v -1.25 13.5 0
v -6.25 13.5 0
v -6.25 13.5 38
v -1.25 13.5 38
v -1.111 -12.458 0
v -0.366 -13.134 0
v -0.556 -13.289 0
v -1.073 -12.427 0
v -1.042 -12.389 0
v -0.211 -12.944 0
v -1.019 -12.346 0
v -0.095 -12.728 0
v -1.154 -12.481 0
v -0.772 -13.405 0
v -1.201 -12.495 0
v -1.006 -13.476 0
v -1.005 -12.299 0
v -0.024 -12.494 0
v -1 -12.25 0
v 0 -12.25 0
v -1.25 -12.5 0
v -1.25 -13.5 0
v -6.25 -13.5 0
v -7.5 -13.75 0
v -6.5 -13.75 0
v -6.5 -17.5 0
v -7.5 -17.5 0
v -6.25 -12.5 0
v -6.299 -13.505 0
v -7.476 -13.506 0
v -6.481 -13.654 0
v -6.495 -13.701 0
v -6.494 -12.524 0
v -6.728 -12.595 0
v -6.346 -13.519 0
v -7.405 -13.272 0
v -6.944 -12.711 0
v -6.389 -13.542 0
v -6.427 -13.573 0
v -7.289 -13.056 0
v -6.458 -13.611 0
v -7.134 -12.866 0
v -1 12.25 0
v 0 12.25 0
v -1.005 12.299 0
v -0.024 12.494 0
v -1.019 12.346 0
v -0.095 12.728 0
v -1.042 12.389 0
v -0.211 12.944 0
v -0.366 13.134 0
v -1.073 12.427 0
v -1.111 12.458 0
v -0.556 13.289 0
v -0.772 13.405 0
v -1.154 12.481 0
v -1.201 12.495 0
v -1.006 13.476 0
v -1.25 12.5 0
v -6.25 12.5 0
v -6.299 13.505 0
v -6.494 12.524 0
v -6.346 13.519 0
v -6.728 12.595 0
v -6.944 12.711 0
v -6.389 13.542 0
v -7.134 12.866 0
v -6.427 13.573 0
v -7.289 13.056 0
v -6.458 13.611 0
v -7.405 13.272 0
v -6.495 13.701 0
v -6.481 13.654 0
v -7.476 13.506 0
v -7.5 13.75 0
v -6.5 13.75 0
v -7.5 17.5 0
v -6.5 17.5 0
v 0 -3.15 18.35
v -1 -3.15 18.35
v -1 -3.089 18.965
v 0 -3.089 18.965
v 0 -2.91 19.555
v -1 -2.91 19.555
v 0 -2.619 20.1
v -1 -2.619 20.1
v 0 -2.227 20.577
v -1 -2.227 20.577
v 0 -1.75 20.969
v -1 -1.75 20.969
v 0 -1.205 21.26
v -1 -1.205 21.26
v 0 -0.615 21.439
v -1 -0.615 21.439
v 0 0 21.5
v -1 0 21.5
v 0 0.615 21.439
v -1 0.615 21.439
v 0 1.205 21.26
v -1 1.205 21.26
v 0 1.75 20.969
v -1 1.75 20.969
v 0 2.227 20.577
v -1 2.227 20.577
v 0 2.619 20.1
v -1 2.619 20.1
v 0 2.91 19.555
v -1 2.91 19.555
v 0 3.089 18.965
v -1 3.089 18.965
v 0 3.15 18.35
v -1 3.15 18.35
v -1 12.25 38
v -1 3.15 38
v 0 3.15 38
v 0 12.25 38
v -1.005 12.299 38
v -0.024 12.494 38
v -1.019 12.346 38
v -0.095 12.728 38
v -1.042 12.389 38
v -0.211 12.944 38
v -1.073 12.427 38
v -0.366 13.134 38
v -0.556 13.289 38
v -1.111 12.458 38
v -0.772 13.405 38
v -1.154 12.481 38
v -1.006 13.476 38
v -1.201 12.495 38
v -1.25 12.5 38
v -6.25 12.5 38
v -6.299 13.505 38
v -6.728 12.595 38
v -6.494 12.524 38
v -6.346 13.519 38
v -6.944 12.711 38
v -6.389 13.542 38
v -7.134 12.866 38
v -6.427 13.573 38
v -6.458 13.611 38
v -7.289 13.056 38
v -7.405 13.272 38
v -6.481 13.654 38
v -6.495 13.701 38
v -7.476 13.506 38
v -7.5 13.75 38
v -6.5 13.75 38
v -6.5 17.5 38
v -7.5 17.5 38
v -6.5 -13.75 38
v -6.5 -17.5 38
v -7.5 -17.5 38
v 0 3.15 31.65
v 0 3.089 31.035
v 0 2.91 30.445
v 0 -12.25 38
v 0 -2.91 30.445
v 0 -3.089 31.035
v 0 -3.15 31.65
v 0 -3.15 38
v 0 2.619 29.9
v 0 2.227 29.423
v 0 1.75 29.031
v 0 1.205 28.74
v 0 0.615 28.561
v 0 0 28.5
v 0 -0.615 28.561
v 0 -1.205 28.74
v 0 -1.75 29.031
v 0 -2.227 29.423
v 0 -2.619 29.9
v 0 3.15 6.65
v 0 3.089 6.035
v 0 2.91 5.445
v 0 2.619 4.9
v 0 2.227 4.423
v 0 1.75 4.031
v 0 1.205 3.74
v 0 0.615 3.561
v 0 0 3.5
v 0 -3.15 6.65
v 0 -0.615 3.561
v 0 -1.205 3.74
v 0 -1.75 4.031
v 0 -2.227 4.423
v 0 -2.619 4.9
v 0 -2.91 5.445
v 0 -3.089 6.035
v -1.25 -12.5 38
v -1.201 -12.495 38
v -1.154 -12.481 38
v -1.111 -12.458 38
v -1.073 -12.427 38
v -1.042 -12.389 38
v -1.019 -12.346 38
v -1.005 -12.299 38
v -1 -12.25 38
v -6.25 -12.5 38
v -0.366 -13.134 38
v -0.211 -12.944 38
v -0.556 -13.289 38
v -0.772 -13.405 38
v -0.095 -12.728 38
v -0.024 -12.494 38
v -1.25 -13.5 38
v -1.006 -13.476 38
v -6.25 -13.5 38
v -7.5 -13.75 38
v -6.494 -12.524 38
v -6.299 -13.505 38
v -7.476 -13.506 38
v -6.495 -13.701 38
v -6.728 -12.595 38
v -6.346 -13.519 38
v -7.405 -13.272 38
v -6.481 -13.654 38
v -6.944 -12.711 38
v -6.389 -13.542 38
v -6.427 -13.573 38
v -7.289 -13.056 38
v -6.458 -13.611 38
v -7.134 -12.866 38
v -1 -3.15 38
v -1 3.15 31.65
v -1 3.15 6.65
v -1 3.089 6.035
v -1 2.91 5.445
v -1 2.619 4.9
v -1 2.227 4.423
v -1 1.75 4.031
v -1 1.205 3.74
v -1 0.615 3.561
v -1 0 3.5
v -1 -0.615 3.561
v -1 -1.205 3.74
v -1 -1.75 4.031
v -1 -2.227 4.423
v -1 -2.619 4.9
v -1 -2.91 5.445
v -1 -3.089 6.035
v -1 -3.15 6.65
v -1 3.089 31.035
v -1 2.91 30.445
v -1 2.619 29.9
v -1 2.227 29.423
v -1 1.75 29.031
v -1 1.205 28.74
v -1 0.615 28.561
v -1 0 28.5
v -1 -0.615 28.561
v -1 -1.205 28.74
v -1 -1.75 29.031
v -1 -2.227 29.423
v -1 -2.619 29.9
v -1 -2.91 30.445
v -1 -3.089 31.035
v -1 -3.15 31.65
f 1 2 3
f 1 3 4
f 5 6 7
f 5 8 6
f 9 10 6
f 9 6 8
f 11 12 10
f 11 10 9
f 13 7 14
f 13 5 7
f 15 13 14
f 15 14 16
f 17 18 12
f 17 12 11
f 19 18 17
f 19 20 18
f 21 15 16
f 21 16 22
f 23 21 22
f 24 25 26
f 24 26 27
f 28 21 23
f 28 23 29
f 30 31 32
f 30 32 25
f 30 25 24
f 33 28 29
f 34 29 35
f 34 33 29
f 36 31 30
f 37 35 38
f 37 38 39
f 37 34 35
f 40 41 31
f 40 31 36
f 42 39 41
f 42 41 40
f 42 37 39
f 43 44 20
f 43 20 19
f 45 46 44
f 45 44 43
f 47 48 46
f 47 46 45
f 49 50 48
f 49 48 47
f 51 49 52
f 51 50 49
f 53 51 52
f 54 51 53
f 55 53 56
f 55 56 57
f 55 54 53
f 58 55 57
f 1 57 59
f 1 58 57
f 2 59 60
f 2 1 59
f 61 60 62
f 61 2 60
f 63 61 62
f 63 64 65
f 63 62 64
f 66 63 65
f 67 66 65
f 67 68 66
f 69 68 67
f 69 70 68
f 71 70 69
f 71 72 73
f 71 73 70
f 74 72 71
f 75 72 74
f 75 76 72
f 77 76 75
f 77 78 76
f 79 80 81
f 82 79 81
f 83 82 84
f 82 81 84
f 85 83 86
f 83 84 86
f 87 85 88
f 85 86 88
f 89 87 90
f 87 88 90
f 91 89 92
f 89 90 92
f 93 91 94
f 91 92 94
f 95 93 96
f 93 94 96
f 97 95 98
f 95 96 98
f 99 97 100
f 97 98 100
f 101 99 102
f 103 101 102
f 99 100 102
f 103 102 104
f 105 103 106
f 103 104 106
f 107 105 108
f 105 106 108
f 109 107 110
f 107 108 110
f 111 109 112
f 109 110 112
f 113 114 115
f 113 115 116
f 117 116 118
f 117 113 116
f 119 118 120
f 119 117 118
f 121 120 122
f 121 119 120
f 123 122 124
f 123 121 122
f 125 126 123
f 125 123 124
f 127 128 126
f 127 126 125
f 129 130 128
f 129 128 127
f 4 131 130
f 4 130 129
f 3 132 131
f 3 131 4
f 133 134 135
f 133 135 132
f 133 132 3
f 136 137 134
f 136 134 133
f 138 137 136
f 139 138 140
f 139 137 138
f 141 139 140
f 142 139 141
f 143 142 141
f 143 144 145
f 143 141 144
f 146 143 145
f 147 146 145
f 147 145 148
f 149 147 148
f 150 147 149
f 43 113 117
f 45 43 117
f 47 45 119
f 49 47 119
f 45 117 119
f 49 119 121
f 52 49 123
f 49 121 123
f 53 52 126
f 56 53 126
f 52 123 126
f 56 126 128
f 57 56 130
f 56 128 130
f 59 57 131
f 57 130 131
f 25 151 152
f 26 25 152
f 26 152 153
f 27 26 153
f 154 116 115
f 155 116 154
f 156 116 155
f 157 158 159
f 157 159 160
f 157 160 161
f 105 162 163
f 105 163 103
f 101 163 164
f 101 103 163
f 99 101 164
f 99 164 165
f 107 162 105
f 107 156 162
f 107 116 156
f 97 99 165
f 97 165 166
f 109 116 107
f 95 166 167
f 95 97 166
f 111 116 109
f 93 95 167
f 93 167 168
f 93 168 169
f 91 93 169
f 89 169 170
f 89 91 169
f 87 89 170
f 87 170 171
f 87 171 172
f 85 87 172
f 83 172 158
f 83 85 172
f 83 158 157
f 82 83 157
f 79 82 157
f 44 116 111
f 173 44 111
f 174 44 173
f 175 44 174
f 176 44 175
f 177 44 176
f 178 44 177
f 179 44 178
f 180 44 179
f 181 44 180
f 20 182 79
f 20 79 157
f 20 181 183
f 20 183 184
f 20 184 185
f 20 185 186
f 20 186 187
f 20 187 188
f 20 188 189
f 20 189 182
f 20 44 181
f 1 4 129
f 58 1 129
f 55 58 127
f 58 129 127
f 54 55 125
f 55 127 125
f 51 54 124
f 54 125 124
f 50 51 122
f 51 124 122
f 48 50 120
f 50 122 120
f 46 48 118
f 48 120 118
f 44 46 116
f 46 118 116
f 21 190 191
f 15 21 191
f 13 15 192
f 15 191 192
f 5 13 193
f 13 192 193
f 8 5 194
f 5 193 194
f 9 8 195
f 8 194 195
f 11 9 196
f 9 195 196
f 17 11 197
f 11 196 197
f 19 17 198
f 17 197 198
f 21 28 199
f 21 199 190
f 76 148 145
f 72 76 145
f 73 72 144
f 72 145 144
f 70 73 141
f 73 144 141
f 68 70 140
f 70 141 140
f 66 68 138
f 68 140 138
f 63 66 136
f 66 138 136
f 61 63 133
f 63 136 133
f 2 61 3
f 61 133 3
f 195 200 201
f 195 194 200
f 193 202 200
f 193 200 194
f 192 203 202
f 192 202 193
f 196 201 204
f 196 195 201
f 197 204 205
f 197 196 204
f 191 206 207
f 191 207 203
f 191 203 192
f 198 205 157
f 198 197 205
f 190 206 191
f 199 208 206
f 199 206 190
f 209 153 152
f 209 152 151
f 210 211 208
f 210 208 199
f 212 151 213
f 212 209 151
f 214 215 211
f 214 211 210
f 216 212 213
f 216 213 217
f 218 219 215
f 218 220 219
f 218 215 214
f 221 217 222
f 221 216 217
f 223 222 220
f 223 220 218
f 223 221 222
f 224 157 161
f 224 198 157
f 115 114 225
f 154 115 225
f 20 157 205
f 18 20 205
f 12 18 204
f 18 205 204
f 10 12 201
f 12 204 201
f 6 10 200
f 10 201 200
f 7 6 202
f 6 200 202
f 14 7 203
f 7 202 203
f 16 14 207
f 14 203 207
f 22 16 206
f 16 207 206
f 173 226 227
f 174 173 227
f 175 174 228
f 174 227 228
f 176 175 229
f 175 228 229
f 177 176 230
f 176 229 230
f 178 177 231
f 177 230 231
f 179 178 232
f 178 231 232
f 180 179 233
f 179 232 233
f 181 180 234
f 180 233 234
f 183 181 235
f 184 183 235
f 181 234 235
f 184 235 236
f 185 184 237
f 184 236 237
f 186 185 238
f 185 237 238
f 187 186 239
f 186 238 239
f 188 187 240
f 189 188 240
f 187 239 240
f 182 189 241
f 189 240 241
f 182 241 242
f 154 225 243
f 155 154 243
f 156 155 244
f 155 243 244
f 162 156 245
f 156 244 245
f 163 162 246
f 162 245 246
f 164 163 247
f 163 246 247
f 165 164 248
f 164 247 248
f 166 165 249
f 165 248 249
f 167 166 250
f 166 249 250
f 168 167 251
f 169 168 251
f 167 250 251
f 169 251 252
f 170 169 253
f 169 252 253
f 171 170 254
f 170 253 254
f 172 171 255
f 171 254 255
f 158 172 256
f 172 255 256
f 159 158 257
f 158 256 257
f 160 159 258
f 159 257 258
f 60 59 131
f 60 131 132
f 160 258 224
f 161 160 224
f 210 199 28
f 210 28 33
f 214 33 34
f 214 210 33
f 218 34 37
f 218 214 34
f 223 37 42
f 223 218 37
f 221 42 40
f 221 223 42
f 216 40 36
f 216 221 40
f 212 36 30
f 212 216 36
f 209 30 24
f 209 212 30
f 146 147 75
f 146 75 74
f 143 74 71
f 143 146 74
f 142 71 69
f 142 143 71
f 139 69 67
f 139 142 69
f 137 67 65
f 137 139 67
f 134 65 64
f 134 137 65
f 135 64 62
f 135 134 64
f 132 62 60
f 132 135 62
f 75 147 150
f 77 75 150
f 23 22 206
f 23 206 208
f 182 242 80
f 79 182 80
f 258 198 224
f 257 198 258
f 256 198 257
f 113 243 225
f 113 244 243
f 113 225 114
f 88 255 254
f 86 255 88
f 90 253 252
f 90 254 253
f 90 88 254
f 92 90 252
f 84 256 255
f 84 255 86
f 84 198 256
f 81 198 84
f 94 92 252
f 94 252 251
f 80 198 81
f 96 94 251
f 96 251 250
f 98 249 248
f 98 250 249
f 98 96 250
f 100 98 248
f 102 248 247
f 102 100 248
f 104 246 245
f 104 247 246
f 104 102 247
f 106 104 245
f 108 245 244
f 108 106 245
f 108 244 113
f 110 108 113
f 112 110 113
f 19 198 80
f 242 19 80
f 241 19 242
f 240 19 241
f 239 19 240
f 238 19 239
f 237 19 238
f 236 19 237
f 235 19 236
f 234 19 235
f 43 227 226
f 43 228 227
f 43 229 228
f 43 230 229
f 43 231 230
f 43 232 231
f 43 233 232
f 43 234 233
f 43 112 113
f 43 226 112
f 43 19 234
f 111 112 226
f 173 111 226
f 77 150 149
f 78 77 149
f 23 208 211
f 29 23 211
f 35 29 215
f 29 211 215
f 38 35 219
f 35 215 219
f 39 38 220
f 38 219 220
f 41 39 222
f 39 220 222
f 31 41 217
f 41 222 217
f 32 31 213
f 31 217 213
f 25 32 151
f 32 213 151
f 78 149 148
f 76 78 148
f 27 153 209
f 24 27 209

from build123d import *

# Parameters (mm, degrees)
EXTRUDE_THIN1_DEPTH = 50.8
CUT_EXTRUDE1_START  = -8.5
CUT_EXTRUDE1_DEPTH  = 9.5
LPATTERN1_COUNT     = 2
LPATTERN1_PITCH     = 25
FILLET1_R           = 0.25
FILLET2_R           = 1.25
SKETCH5_W           = 12.8
SKETCH5_H           = 35
CUT_EXTRUDE2_DEPTH  = 8.5


with BuildPart() as part:
    # Sketch3 → Extrude-Thin1 (new body)
    with BuildSketch(Plane.XY):
        Polygon((-6.5, 17.5), (-6.5, 13.5), (0, 13.5), (0, -13.5), (-6.5, -13.5), (-6.5, -17.5), (-7.5, -17.5), (-7.5, -12.5), (-1, -12.5), (-1, 12.5), (-7.5, 12.5), (-7.5, 17.5), align=None)
    extrude(amount=EXTRUDE_THIN1_DEPTH)

    # Sketch4 → Cut-Extrude1 (cut)
    with BuildSketch(Plane(origin=(0, 0, 0), x_dir=(0, 0, -1), z_dir=(1, 0, 0)).offset(CUT_EXTRUDE1_START)):
        with BuildLine():
            Line((-6.65, -3.15), (-18.35, -3.15))
            ThreePointArc((-18.35, -3.15), (-21.5, 0), (-18.35, 3.15))
            Line((-18.35, 3.15), (-6.65, 3.15))
            ThreePointArc((-6.65, 3.15), (-3.5, 0), (-6.65, -3.15))
        make_face()
    cut_extrude1 = extrude(amount=CUT_EXTRUDE1_DEPTH, mode=Mode.SUBTRACT)

    # LPattern1: Cut-Extrude1 ×2
    with Locations(*[(0, 0, i * LPATTERN1_PITCH) for i in range(1, LPATTERN1_COUNT)]):
        add(cut_extrude1, mode=Mode.SUBTRACT)

    # Fillet1
    fillet1_edges = [part.edges().sort_by_distance(p)[0] for p in [
        (-6.5, 13.5, 25.4),
        (-6.5, -13.5, 25.4),
        (-1, -12.5, 25.4),
        (-1, 12.5, 25.4),
    ]]
    fillet(fillet1_edges, radius=FILLET1_R)

    # Fillet2
    fillet2_edges = [part.edges().sort_by_distance(p)[0] for p in [
        (0, 13.5, 25.4),
        (0, -13.5, 25.4),
        (-7.5, -12.5, 25.4),
        (-7.5, 12.5, 25.4),
    ]]
    fillet(fillet2_edges, radius=FILLET2_R)

    # Sketch5 → Cut-Extrude2 (cut, through all)
    with BuildSketch(Plane.ZY.offset(7.5)):
        with Locations((44.4, 0)):
            Rectangle(SKETCH5_W, SKETCH5_H)
    extrude(amount=-CUT_EXTRUDE2_DEPTH, mode=Mode.SUBTRACT)


solid = part.part
